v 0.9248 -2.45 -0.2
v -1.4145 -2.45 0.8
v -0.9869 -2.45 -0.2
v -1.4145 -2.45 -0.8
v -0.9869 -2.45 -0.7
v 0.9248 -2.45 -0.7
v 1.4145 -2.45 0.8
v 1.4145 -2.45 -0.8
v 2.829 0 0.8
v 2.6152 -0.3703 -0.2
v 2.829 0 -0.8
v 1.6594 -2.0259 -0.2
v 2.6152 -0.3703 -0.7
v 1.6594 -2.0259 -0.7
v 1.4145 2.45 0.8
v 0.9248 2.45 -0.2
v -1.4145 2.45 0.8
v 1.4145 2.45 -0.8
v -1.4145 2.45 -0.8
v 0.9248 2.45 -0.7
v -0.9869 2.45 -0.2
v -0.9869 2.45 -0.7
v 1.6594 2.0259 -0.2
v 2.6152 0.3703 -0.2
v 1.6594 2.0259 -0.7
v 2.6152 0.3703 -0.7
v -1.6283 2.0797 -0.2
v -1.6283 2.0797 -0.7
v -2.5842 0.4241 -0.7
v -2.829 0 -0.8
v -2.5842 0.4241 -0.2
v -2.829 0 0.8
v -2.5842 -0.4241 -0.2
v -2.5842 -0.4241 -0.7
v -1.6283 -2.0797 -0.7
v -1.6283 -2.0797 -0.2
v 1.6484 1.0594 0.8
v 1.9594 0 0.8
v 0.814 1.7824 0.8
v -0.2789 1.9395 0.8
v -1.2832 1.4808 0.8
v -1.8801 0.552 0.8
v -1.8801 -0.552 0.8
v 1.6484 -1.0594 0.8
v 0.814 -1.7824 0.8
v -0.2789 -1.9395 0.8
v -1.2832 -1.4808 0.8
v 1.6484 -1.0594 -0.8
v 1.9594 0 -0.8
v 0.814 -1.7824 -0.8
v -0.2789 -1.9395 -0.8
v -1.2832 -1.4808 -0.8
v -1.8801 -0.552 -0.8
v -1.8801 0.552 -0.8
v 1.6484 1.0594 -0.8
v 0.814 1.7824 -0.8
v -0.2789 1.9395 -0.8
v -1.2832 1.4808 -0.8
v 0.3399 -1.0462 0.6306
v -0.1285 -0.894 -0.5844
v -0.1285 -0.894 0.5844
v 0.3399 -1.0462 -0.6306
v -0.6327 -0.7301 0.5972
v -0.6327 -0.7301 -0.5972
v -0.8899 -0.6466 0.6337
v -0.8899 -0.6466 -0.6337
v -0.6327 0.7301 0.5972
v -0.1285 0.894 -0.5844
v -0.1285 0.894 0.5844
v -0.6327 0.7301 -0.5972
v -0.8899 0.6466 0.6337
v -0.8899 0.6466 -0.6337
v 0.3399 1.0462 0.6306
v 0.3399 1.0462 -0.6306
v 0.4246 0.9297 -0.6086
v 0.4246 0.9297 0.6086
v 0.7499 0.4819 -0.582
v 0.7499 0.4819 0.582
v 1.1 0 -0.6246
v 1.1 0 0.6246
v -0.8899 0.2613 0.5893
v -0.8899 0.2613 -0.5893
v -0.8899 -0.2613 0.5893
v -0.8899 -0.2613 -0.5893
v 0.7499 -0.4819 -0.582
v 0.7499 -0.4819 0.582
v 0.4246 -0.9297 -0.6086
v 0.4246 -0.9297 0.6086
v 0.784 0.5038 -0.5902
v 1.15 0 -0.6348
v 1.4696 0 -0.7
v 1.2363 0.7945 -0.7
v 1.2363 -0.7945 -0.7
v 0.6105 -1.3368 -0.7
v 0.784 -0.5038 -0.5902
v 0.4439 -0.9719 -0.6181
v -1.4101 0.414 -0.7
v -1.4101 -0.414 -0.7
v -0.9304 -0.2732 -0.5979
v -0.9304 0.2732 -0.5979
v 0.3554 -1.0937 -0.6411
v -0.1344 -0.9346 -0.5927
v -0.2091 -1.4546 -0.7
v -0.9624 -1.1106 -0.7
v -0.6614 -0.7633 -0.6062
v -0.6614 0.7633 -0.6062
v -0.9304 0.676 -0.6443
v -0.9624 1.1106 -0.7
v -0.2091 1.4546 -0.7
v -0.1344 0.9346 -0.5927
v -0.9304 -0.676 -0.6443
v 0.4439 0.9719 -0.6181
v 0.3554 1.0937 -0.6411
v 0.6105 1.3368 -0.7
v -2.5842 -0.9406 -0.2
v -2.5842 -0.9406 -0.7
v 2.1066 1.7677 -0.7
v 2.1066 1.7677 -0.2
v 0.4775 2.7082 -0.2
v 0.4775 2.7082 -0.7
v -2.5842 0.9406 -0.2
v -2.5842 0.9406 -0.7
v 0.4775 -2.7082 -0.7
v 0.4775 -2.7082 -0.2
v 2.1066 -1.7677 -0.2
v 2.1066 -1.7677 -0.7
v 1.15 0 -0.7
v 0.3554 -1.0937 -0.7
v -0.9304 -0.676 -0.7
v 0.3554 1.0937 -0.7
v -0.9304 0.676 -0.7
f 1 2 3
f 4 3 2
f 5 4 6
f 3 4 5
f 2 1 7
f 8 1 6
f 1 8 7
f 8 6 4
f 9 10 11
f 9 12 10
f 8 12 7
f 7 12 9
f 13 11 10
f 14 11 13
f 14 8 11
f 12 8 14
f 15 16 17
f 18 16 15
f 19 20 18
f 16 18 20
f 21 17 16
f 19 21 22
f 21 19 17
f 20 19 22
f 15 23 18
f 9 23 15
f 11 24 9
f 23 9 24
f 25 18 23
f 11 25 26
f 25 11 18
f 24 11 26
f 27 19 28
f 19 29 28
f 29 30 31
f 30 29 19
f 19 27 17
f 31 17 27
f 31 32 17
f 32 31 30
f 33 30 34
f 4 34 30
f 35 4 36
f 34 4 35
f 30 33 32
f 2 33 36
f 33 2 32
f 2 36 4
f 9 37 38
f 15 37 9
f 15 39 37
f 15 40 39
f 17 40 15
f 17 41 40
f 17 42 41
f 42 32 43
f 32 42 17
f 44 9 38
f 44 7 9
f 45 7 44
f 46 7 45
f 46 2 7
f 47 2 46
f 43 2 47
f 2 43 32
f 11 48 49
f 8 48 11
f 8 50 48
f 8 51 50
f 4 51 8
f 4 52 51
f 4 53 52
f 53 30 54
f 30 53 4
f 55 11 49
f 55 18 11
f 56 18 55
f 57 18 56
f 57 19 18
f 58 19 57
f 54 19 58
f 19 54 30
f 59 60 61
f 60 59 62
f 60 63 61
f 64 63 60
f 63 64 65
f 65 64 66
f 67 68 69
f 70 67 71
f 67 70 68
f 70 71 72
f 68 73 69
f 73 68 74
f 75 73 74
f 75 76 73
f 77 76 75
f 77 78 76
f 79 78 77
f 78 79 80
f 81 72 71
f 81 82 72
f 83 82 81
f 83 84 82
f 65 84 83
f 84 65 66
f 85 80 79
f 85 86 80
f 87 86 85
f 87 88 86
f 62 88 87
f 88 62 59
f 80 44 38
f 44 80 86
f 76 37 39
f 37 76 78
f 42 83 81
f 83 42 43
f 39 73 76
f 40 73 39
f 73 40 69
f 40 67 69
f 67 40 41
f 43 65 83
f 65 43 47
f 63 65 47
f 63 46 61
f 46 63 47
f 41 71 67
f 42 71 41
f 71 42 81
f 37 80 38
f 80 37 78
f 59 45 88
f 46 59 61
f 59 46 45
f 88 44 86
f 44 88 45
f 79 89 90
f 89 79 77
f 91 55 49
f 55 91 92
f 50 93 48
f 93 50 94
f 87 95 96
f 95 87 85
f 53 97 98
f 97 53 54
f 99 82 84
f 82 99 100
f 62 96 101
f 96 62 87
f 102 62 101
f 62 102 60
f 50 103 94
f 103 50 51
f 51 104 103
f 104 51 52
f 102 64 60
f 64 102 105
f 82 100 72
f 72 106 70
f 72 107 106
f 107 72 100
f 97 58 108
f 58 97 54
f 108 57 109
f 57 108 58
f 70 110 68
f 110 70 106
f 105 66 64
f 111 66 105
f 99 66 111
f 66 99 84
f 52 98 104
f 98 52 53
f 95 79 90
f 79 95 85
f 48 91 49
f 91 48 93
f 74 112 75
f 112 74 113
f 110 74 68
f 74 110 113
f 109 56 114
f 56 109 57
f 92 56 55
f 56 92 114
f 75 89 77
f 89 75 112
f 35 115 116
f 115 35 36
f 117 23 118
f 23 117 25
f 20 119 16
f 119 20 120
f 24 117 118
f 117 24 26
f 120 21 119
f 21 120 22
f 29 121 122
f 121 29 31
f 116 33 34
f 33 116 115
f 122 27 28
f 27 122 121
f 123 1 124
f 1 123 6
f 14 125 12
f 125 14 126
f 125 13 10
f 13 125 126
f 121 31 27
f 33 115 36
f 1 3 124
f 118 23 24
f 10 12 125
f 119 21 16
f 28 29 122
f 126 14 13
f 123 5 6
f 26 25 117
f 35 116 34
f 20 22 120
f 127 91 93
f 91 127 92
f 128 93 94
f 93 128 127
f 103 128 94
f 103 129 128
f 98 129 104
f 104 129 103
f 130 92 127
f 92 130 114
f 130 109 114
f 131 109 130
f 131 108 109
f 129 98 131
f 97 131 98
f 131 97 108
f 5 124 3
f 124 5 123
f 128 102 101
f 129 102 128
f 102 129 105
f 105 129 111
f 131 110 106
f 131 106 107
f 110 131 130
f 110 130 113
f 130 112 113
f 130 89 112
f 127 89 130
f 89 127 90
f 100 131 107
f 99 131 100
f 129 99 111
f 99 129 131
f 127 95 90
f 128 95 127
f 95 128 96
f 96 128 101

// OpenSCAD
// Parameters
thread_diameter_mm = 2.0; //[1.0:4.0:0.05]
across_flats_mm = 4.9; //[2.45:9.8:0.05]
thickness_mm = 1.6; //[0.8:3.2:0.05]
hole_type = 0; //[0:1:1]
chamfer_top_mm = 0.1; //[0.0:0.4:0.05]
chamfer_bottom_mm = 0.1; //[0.0:0.4:0.05]
clearance_extra_mm = 0.2; //[0.0:0.6:0.05]
thread_pilot_shrink_mm = 0.15; //[0.0:0.4:0.05]
eps_mm = 0.6; //[0.2:2.0:0.1]
washer_enabled = 1; //[0:1:1]
washer_outer_diameter_mm = 5.5; //[3.0:11.0:0.1]
washer_thickness_mm = 0.5; //[0.25:1.5:0.05]
washer_hole_extra_mm = 0.3; //[0.0:0.8:0.05]
washer_overlap_mm = 0.6; //[0.2:1.5:0.1]

// M2 Nut - complete geometry
module nut() {
  color("DimGray") {
    difference() {
      // Hex nut body
      cylinder(r=across_flats_mm/(2*cos(30)), h=thickness_mm, center=true, $fn=6);
      // Central thread hole
      cylinder(r=((thread_diameter_mm + clearance_extra_mm)*(1-hole_type) + (thread_diameter_mm - thread_pilot_shrink_mm)*hole_type)/2, 
               h=thickness_mm + 2*eps_mm, center=true);
      // Top chamfer
      translate([0, 0, thickness_mm/2 - (chamfer_top_mm + eps_mm)/2 + eps_mm/2])
        rotate([180, 0, 0])
        cylinder(r1=across_flats_mm/(2*cos(30)) + eps_mm, r2=0, h=chamfer_top_mm + eps_mm, center=true);
      // Bottom chamfer
      translate([0, 0, -thickness_mm/2 + (chamfer_bottom_mm + eps_mm)/2 - eps_mm/2])
        cylinder(r1=across_flats_mm/(2*cos(30)) + eps_mm, r2=0, h=chamfer_bottom_mm + eps_mm, center=true);
    }
  }
}

// Washer - complete geometry
module washer() {
  if (washer_enabled) {
    color("Silver") {
      difference() {
        // Washer outer
        translate([0, 0, -thickness_mm/2 - washer_thickness_mm/2 + washer_overlap_mm])
          cylinder(r=washer_outer_diameter_mm/2, h=washer_thickness_mm, center=true);
        // Washer hole
        translate([0, 0, -thickness_mm/2 - washer_thickness_mm/2 + washer_overlap_mm])
          cylinder(r=(thread_diameter_mm + washer_hole_extra_mm)/2, h=washer_thickness_mm + 2*eps_mm, center=true);
      }
    }
  }
}

// Assembly
module assembly() {
  nut();
  washer();
}

assembly();
